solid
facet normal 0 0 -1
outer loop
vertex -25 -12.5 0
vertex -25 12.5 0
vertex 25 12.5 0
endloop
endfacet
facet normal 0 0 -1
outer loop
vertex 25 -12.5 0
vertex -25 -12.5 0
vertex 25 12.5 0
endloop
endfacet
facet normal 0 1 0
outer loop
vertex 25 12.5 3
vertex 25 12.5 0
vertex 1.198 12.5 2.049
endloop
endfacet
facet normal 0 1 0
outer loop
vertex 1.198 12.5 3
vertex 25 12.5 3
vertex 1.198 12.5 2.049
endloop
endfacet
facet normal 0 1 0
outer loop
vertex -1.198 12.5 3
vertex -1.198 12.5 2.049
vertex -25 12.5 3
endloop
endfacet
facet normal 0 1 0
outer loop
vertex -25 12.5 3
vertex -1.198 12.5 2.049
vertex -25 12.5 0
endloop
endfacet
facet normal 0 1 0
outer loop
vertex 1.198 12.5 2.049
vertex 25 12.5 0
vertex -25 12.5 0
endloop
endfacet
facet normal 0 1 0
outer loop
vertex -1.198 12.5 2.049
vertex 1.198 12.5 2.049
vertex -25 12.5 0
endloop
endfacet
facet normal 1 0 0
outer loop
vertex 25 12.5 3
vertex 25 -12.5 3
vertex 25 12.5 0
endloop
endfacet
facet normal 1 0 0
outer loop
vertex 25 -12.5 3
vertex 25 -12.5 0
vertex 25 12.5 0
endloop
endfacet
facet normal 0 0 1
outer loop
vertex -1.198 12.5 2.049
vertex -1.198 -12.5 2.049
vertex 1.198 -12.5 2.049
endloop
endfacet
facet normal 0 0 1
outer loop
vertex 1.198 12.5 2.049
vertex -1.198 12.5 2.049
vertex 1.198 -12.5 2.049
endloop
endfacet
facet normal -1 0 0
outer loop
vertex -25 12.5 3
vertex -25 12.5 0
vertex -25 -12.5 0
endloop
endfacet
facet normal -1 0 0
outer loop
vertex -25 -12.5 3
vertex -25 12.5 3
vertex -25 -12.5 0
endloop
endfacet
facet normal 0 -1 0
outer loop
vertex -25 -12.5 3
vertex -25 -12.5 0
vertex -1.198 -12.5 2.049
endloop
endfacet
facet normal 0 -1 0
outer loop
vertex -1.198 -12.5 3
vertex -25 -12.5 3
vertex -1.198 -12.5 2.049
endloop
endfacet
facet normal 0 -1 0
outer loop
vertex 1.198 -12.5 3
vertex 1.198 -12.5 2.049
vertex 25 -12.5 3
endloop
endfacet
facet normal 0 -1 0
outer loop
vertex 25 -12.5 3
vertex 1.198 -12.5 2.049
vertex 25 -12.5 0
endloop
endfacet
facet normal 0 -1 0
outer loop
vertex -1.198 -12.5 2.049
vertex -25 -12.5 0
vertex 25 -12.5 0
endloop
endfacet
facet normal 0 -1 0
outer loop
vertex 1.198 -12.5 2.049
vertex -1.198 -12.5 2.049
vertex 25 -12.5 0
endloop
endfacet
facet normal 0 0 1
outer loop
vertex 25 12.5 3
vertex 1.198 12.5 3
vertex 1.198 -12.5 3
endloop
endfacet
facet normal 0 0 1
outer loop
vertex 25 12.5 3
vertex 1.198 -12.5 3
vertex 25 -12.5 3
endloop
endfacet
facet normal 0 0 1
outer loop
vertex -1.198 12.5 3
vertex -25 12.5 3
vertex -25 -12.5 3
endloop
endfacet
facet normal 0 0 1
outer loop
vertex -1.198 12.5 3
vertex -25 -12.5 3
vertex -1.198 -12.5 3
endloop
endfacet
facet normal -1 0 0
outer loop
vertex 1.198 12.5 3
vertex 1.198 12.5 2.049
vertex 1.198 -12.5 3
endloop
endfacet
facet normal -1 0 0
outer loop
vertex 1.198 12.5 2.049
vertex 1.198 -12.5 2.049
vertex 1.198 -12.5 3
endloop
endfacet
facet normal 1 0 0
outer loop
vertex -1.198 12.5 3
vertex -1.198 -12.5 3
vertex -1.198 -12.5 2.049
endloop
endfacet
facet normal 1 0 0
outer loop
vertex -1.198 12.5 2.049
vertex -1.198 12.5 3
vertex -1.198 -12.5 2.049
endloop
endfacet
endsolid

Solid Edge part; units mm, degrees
sketch "Sketch1" plane through (0, 0, 0) normal (0, 0, 1) x (1, 0, 0)
  line L0 (-25, -12.5) -> (25, -12.5)
  line L1 (25, -12.5) -> (25, 12.5)
  line L2 (25, 12.5) -> (-25, 12.5)
  line L3 (-25, 12.5) -> (-25, -12.5)
extrude "Protrusion1" add sketch "Sketch1" along normal blind 3
sketch "Sketch2" plane through (0, -12.5, 1.5) normal (0, -1, 0) x (1, 0, 0)
  line L0 (-1.1982, 0.5492) -> (1.1982, 0.5492)
  line L1 (1.1982, 0.5492) -> (1.1982, 2.4508)
  line L2 (1.1982, 2.4508) -> (-1.1982, 2.4508)
  line L3 (-1.1982, 2.4508) -> (-1.1982, 0.5492)
extrude "Kivágás_1" cut sketch "Sketch2" against normal blind 36.6689 and the other way blind 13.795
